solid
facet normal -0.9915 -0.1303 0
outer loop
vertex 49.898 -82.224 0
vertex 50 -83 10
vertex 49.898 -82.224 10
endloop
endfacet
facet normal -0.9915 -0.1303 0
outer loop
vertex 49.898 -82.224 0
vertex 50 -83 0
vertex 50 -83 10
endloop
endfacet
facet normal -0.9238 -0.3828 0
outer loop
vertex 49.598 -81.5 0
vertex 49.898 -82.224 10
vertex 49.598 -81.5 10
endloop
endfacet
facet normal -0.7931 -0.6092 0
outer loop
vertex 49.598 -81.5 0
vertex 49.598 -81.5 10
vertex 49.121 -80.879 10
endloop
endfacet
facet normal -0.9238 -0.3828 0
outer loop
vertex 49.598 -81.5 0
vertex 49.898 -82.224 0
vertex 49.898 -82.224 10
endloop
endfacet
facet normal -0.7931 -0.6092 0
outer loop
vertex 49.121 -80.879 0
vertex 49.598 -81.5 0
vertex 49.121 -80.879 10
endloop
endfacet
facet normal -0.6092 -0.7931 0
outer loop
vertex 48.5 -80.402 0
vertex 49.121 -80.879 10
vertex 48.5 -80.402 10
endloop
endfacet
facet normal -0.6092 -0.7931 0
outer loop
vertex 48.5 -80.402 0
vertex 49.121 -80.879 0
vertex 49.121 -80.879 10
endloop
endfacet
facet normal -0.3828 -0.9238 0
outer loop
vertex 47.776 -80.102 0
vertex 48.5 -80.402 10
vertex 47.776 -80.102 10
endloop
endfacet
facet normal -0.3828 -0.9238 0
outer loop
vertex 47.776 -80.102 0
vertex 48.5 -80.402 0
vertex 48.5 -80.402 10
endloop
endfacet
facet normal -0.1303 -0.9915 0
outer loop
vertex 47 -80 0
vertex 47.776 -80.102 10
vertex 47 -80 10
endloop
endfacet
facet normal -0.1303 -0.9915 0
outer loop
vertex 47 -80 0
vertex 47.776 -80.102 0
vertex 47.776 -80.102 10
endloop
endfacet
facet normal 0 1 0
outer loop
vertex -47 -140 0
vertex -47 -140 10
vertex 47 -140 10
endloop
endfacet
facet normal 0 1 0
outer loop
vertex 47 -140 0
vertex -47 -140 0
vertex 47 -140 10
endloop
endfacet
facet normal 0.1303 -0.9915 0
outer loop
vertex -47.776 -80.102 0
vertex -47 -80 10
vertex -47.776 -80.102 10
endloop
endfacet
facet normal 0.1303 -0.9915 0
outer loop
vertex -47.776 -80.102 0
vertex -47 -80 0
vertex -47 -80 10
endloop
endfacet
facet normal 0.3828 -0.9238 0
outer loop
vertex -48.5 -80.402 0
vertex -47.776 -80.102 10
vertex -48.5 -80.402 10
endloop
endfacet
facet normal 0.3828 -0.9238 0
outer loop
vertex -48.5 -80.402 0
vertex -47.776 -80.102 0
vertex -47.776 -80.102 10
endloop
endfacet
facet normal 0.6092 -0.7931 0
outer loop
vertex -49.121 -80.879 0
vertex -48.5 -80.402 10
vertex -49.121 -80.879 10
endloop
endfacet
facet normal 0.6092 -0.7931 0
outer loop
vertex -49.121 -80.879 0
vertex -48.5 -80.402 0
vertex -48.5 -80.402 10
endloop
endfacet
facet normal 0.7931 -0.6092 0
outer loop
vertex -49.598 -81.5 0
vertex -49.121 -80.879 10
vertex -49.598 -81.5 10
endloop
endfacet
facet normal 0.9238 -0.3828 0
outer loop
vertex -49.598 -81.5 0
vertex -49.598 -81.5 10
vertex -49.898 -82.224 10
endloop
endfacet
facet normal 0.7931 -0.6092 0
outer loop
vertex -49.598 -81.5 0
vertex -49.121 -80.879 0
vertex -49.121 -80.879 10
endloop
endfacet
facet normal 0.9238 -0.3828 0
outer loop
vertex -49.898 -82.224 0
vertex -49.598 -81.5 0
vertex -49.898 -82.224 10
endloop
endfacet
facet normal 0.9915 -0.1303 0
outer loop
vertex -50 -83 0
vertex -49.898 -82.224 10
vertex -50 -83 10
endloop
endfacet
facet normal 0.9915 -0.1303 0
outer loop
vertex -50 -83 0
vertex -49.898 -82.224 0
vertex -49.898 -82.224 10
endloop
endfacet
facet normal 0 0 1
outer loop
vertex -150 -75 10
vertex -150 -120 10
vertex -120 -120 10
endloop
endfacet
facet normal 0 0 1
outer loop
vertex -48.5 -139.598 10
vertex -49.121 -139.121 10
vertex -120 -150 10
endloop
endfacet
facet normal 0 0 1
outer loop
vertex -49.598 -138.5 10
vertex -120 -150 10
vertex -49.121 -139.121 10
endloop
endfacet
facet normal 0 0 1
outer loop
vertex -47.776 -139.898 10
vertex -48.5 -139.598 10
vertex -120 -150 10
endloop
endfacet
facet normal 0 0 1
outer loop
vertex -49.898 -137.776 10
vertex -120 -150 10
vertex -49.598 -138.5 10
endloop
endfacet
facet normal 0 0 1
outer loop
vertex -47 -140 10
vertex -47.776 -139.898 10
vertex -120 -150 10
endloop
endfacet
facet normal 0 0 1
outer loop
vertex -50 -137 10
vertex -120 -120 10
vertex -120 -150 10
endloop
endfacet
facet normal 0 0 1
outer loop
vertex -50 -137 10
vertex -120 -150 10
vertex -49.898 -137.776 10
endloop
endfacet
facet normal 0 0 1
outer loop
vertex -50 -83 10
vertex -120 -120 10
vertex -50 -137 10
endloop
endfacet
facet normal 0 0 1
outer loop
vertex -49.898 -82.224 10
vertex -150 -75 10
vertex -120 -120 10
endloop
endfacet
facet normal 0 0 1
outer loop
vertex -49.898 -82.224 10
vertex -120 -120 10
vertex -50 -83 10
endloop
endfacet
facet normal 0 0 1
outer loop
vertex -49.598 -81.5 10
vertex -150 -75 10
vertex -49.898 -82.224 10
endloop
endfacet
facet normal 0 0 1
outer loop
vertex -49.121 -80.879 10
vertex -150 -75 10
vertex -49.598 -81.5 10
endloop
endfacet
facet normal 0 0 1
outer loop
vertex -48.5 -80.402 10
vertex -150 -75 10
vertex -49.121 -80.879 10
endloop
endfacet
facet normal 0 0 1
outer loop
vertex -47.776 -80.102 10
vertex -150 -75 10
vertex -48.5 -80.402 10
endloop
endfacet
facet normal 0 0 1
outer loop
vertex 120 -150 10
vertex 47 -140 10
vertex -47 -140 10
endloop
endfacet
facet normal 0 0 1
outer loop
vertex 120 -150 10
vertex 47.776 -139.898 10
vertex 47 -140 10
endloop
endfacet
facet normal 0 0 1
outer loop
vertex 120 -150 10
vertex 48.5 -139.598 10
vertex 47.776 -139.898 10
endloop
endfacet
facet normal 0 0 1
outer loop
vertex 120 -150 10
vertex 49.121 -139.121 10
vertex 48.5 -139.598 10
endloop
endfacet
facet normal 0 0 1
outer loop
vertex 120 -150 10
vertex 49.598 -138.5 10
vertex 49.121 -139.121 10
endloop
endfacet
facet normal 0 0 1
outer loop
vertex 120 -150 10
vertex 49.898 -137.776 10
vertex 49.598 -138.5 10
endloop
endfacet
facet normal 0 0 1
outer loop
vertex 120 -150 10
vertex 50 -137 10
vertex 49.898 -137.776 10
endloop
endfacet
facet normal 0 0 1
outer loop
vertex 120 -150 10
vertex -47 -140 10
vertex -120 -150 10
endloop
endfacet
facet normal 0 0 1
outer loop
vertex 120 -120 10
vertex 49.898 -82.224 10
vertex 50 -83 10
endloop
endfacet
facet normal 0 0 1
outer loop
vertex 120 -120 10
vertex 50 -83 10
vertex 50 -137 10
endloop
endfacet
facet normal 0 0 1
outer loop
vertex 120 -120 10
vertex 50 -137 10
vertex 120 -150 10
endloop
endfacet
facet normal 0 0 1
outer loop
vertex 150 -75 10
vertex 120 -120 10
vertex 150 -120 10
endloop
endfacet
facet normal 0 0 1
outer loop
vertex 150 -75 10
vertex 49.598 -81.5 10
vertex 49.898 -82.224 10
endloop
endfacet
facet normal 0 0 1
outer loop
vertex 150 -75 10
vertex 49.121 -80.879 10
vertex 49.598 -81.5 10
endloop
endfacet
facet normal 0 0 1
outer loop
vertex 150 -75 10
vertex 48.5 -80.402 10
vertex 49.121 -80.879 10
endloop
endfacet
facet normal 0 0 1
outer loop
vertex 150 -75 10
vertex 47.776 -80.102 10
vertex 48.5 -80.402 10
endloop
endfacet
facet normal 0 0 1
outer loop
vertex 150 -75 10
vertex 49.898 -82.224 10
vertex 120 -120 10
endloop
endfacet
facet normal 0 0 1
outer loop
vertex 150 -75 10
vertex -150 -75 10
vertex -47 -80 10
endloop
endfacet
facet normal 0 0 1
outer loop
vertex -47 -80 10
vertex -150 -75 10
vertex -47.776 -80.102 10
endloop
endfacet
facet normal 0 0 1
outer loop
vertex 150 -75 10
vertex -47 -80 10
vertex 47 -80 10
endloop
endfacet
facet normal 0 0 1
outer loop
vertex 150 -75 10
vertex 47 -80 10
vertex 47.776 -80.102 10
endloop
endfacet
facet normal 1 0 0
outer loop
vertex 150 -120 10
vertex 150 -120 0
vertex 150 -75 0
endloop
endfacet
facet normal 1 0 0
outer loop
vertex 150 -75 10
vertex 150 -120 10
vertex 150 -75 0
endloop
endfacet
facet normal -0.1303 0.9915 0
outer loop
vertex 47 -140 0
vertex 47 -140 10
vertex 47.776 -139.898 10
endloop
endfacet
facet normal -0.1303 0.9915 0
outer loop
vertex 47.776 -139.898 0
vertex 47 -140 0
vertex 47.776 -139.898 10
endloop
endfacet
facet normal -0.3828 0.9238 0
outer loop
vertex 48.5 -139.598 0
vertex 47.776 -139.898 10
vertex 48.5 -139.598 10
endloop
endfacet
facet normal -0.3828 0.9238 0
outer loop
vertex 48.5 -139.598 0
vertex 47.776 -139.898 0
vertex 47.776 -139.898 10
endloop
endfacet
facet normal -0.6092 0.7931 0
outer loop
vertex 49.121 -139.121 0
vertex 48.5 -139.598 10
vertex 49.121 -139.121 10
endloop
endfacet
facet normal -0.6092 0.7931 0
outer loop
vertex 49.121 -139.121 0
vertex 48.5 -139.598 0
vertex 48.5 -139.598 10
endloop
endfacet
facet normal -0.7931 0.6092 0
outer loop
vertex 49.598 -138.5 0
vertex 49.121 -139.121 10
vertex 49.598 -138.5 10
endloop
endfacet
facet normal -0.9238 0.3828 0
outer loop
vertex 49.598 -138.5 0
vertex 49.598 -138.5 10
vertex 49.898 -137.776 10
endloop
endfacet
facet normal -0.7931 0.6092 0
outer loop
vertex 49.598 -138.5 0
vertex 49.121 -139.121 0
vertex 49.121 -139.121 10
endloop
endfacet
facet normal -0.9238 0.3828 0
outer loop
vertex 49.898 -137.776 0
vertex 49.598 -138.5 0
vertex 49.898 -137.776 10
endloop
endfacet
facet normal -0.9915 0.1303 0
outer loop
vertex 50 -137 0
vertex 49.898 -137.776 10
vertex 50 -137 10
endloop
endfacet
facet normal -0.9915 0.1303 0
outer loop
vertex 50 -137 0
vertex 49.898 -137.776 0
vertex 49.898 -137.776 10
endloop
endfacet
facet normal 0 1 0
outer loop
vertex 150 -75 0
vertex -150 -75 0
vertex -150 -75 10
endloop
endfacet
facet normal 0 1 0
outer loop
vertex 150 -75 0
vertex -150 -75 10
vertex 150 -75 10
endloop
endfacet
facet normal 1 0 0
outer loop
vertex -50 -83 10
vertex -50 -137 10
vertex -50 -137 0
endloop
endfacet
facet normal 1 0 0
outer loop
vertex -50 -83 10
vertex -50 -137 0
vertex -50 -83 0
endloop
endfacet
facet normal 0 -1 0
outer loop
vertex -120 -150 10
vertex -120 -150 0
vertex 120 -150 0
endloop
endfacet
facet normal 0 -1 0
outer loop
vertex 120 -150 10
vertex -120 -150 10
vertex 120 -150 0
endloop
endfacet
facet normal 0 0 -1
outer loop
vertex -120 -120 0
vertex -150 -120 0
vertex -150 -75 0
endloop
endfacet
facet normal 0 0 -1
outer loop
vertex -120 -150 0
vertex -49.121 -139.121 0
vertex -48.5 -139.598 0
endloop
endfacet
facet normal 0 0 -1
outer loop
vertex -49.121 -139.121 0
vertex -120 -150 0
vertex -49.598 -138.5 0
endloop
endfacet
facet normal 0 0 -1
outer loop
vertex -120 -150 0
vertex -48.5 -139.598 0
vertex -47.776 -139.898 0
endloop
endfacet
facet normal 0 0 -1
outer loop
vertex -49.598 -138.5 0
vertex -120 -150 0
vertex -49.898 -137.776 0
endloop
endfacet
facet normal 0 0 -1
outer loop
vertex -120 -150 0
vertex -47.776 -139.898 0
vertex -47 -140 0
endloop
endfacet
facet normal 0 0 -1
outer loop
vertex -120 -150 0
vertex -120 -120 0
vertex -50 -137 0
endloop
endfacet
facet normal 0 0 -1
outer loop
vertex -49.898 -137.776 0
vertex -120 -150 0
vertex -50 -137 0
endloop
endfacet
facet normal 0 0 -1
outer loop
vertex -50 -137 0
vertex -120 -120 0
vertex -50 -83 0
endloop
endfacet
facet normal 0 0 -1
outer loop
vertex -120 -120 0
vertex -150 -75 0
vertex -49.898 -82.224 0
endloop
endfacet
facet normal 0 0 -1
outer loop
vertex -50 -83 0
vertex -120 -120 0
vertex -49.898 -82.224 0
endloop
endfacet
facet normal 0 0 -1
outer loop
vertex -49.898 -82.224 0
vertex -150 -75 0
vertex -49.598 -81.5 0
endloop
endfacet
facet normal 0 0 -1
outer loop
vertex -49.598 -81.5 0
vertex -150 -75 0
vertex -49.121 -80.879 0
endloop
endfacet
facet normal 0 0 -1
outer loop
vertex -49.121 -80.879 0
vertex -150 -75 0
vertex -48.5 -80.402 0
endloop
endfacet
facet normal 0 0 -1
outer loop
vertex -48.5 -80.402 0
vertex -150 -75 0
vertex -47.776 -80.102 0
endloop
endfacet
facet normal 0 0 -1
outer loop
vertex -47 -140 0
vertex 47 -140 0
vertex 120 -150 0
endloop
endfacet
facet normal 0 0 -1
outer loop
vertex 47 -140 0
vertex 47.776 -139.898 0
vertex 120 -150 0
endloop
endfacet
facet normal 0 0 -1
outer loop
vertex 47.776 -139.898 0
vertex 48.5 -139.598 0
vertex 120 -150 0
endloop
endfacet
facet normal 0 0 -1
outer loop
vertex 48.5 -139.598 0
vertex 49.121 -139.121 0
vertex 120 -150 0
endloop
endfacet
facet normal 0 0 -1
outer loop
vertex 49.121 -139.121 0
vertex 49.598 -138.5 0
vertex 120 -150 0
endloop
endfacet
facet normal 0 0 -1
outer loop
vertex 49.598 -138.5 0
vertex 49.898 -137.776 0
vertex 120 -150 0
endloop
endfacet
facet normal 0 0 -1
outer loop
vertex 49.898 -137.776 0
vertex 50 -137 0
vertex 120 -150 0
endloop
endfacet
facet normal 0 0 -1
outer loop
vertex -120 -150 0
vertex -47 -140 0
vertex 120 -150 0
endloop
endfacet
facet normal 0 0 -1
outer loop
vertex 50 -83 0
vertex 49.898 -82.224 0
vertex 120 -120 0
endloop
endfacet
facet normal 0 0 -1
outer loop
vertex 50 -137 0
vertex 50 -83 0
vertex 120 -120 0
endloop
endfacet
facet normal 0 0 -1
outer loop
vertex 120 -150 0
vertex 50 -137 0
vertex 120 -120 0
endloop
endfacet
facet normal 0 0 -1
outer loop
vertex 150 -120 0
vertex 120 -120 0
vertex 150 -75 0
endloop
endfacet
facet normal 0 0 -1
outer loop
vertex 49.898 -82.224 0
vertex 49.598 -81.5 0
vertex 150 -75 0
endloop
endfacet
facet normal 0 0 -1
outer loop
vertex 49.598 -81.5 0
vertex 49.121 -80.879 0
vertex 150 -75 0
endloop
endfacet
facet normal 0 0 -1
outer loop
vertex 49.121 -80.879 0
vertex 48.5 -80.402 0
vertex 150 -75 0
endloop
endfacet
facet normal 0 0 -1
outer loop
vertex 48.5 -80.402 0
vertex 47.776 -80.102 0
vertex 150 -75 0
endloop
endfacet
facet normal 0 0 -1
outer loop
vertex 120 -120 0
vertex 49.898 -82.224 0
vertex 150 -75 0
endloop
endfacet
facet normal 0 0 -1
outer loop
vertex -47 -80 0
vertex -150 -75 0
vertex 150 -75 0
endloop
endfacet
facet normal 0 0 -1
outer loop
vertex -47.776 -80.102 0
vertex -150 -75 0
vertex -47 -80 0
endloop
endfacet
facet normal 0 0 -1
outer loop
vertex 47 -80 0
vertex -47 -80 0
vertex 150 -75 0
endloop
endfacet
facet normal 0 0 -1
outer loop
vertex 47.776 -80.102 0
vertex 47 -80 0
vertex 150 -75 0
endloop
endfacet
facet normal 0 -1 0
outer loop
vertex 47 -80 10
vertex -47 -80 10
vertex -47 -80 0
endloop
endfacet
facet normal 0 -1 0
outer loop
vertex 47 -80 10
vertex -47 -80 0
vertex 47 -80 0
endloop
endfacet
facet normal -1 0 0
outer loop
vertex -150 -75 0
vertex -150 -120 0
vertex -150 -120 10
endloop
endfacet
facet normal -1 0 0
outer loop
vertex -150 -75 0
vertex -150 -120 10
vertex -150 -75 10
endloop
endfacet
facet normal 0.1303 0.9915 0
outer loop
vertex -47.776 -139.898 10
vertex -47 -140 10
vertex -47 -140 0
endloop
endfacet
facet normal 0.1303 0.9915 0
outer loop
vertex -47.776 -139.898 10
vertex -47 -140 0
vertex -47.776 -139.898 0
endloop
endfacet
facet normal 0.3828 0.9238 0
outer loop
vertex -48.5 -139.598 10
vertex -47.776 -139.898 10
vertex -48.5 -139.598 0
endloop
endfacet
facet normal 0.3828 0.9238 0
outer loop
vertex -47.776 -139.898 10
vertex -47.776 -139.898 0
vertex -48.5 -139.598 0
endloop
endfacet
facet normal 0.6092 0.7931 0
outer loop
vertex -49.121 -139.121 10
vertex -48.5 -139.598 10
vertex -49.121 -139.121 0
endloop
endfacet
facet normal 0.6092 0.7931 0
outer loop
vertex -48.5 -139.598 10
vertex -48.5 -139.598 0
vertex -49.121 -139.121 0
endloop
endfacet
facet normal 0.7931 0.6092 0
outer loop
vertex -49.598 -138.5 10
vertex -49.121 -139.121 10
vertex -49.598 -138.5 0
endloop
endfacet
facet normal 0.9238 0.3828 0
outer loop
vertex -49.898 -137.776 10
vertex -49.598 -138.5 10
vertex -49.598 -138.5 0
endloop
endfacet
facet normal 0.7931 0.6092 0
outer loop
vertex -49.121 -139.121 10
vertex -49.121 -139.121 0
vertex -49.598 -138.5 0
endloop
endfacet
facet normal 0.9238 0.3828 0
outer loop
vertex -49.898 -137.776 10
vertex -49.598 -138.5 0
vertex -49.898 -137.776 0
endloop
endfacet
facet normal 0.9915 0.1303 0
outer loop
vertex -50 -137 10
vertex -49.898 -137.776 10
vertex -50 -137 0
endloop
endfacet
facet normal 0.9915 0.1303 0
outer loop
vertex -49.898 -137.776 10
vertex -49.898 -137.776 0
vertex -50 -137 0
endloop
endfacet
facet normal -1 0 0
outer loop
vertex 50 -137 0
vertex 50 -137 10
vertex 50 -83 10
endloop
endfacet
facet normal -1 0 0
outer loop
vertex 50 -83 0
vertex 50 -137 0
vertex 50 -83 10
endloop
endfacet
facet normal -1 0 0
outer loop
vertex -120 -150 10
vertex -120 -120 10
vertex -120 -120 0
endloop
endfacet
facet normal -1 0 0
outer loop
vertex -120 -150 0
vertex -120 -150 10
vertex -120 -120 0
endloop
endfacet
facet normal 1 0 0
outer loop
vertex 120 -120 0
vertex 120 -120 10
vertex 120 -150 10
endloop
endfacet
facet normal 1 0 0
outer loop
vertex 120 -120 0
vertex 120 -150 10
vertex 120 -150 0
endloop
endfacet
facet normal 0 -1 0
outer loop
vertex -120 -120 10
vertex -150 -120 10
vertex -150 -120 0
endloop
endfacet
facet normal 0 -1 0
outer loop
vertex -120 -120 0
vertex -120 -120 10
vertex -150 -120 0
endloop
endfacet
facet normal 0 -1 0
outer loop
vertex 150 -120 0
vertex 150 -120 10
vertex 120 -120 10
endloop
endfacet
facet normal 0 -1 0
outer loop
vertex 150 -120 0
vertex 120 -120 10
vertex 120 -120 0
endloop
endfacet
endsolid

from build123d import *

# Parameters (mm, degrees)
SKIZZE1_W                       = 300
SKIZZE1_H                       = 75
LINEAR_AUSTRAGEN1_DEPTH         = 10
SKIZZE2_W                       = 100
SKIZZE2_H                       = 60
SCHNITT_LINEAR_AUSTRAGEN1_DEPTH = 10
VERRUNDUNG1_R                   = 3
SKIZZE4_W                       = 10
SKIZZE4_H                       = 30
SCHNITT_LINEAR_AUSTRAGEN2_DEPTH = 30


with BuildPart() as part:
    # Skizze1 → Linear austragen1 (new body)
    with BuildSketch(Plane.XY):
        with Locations((0, -112.5)):
            Rectangle(SKIZZE1_W, SKIZZE1_H)
    extrude(amount=LINEAR_AUSTRAGEN1_DEPTH)

    # Skizze2 → Schnitt-Linear austragen1 (cut)
    with BuildSketch(Plane.XY.offset(10)):
        with Locations((0, -110)):
            Rectangle(SKIZZE2_W, SKIZZE2_H)
    extrude(amount=-SCHNITT_LINEAR_AUSTRAGEN1_DEPTH, mode=Mode.SUBTRACT)

    # Verrundung1
    verrundung1_edges = [part.edges().sort_by_distance(p)[0] for p in [
        (50, -80, 5),
        (50, -140, 5),
        (-50, -140, 5),
        (-50, -80, 5),
    ]]
    fillet(verrundung1_edges, radius=VERRUNDUNG1_R)

    # Skizze4 → Schnitt-Linear austragen2 (cut)
    with BuildSketch(Plane(origin=(150, 0, 0), x_dir=(0, 0, -1), z_dir=(1, 0, 0))):
        with Locations((-5, -135)):
            Rectangle(SKIZZE4_W, SKIZZE4_H)
    schnitt_linear_austragen2 = extrude(amount=-SCHNITT_LINEAR_AUSTRAGEN2_DEPTH, mode=Mode.SUBTRACT)

    # Spiegeln1: Schnitt-Linear austragen2 across plane
    add(schnitt_linear_austragen2.mirror(Plane(origin=(0, 0, 0), x_dir=(0, 0, 1), z_dir=(1, 0, 0))), mode=Mode.SUBTRACT)


solid = part.part
